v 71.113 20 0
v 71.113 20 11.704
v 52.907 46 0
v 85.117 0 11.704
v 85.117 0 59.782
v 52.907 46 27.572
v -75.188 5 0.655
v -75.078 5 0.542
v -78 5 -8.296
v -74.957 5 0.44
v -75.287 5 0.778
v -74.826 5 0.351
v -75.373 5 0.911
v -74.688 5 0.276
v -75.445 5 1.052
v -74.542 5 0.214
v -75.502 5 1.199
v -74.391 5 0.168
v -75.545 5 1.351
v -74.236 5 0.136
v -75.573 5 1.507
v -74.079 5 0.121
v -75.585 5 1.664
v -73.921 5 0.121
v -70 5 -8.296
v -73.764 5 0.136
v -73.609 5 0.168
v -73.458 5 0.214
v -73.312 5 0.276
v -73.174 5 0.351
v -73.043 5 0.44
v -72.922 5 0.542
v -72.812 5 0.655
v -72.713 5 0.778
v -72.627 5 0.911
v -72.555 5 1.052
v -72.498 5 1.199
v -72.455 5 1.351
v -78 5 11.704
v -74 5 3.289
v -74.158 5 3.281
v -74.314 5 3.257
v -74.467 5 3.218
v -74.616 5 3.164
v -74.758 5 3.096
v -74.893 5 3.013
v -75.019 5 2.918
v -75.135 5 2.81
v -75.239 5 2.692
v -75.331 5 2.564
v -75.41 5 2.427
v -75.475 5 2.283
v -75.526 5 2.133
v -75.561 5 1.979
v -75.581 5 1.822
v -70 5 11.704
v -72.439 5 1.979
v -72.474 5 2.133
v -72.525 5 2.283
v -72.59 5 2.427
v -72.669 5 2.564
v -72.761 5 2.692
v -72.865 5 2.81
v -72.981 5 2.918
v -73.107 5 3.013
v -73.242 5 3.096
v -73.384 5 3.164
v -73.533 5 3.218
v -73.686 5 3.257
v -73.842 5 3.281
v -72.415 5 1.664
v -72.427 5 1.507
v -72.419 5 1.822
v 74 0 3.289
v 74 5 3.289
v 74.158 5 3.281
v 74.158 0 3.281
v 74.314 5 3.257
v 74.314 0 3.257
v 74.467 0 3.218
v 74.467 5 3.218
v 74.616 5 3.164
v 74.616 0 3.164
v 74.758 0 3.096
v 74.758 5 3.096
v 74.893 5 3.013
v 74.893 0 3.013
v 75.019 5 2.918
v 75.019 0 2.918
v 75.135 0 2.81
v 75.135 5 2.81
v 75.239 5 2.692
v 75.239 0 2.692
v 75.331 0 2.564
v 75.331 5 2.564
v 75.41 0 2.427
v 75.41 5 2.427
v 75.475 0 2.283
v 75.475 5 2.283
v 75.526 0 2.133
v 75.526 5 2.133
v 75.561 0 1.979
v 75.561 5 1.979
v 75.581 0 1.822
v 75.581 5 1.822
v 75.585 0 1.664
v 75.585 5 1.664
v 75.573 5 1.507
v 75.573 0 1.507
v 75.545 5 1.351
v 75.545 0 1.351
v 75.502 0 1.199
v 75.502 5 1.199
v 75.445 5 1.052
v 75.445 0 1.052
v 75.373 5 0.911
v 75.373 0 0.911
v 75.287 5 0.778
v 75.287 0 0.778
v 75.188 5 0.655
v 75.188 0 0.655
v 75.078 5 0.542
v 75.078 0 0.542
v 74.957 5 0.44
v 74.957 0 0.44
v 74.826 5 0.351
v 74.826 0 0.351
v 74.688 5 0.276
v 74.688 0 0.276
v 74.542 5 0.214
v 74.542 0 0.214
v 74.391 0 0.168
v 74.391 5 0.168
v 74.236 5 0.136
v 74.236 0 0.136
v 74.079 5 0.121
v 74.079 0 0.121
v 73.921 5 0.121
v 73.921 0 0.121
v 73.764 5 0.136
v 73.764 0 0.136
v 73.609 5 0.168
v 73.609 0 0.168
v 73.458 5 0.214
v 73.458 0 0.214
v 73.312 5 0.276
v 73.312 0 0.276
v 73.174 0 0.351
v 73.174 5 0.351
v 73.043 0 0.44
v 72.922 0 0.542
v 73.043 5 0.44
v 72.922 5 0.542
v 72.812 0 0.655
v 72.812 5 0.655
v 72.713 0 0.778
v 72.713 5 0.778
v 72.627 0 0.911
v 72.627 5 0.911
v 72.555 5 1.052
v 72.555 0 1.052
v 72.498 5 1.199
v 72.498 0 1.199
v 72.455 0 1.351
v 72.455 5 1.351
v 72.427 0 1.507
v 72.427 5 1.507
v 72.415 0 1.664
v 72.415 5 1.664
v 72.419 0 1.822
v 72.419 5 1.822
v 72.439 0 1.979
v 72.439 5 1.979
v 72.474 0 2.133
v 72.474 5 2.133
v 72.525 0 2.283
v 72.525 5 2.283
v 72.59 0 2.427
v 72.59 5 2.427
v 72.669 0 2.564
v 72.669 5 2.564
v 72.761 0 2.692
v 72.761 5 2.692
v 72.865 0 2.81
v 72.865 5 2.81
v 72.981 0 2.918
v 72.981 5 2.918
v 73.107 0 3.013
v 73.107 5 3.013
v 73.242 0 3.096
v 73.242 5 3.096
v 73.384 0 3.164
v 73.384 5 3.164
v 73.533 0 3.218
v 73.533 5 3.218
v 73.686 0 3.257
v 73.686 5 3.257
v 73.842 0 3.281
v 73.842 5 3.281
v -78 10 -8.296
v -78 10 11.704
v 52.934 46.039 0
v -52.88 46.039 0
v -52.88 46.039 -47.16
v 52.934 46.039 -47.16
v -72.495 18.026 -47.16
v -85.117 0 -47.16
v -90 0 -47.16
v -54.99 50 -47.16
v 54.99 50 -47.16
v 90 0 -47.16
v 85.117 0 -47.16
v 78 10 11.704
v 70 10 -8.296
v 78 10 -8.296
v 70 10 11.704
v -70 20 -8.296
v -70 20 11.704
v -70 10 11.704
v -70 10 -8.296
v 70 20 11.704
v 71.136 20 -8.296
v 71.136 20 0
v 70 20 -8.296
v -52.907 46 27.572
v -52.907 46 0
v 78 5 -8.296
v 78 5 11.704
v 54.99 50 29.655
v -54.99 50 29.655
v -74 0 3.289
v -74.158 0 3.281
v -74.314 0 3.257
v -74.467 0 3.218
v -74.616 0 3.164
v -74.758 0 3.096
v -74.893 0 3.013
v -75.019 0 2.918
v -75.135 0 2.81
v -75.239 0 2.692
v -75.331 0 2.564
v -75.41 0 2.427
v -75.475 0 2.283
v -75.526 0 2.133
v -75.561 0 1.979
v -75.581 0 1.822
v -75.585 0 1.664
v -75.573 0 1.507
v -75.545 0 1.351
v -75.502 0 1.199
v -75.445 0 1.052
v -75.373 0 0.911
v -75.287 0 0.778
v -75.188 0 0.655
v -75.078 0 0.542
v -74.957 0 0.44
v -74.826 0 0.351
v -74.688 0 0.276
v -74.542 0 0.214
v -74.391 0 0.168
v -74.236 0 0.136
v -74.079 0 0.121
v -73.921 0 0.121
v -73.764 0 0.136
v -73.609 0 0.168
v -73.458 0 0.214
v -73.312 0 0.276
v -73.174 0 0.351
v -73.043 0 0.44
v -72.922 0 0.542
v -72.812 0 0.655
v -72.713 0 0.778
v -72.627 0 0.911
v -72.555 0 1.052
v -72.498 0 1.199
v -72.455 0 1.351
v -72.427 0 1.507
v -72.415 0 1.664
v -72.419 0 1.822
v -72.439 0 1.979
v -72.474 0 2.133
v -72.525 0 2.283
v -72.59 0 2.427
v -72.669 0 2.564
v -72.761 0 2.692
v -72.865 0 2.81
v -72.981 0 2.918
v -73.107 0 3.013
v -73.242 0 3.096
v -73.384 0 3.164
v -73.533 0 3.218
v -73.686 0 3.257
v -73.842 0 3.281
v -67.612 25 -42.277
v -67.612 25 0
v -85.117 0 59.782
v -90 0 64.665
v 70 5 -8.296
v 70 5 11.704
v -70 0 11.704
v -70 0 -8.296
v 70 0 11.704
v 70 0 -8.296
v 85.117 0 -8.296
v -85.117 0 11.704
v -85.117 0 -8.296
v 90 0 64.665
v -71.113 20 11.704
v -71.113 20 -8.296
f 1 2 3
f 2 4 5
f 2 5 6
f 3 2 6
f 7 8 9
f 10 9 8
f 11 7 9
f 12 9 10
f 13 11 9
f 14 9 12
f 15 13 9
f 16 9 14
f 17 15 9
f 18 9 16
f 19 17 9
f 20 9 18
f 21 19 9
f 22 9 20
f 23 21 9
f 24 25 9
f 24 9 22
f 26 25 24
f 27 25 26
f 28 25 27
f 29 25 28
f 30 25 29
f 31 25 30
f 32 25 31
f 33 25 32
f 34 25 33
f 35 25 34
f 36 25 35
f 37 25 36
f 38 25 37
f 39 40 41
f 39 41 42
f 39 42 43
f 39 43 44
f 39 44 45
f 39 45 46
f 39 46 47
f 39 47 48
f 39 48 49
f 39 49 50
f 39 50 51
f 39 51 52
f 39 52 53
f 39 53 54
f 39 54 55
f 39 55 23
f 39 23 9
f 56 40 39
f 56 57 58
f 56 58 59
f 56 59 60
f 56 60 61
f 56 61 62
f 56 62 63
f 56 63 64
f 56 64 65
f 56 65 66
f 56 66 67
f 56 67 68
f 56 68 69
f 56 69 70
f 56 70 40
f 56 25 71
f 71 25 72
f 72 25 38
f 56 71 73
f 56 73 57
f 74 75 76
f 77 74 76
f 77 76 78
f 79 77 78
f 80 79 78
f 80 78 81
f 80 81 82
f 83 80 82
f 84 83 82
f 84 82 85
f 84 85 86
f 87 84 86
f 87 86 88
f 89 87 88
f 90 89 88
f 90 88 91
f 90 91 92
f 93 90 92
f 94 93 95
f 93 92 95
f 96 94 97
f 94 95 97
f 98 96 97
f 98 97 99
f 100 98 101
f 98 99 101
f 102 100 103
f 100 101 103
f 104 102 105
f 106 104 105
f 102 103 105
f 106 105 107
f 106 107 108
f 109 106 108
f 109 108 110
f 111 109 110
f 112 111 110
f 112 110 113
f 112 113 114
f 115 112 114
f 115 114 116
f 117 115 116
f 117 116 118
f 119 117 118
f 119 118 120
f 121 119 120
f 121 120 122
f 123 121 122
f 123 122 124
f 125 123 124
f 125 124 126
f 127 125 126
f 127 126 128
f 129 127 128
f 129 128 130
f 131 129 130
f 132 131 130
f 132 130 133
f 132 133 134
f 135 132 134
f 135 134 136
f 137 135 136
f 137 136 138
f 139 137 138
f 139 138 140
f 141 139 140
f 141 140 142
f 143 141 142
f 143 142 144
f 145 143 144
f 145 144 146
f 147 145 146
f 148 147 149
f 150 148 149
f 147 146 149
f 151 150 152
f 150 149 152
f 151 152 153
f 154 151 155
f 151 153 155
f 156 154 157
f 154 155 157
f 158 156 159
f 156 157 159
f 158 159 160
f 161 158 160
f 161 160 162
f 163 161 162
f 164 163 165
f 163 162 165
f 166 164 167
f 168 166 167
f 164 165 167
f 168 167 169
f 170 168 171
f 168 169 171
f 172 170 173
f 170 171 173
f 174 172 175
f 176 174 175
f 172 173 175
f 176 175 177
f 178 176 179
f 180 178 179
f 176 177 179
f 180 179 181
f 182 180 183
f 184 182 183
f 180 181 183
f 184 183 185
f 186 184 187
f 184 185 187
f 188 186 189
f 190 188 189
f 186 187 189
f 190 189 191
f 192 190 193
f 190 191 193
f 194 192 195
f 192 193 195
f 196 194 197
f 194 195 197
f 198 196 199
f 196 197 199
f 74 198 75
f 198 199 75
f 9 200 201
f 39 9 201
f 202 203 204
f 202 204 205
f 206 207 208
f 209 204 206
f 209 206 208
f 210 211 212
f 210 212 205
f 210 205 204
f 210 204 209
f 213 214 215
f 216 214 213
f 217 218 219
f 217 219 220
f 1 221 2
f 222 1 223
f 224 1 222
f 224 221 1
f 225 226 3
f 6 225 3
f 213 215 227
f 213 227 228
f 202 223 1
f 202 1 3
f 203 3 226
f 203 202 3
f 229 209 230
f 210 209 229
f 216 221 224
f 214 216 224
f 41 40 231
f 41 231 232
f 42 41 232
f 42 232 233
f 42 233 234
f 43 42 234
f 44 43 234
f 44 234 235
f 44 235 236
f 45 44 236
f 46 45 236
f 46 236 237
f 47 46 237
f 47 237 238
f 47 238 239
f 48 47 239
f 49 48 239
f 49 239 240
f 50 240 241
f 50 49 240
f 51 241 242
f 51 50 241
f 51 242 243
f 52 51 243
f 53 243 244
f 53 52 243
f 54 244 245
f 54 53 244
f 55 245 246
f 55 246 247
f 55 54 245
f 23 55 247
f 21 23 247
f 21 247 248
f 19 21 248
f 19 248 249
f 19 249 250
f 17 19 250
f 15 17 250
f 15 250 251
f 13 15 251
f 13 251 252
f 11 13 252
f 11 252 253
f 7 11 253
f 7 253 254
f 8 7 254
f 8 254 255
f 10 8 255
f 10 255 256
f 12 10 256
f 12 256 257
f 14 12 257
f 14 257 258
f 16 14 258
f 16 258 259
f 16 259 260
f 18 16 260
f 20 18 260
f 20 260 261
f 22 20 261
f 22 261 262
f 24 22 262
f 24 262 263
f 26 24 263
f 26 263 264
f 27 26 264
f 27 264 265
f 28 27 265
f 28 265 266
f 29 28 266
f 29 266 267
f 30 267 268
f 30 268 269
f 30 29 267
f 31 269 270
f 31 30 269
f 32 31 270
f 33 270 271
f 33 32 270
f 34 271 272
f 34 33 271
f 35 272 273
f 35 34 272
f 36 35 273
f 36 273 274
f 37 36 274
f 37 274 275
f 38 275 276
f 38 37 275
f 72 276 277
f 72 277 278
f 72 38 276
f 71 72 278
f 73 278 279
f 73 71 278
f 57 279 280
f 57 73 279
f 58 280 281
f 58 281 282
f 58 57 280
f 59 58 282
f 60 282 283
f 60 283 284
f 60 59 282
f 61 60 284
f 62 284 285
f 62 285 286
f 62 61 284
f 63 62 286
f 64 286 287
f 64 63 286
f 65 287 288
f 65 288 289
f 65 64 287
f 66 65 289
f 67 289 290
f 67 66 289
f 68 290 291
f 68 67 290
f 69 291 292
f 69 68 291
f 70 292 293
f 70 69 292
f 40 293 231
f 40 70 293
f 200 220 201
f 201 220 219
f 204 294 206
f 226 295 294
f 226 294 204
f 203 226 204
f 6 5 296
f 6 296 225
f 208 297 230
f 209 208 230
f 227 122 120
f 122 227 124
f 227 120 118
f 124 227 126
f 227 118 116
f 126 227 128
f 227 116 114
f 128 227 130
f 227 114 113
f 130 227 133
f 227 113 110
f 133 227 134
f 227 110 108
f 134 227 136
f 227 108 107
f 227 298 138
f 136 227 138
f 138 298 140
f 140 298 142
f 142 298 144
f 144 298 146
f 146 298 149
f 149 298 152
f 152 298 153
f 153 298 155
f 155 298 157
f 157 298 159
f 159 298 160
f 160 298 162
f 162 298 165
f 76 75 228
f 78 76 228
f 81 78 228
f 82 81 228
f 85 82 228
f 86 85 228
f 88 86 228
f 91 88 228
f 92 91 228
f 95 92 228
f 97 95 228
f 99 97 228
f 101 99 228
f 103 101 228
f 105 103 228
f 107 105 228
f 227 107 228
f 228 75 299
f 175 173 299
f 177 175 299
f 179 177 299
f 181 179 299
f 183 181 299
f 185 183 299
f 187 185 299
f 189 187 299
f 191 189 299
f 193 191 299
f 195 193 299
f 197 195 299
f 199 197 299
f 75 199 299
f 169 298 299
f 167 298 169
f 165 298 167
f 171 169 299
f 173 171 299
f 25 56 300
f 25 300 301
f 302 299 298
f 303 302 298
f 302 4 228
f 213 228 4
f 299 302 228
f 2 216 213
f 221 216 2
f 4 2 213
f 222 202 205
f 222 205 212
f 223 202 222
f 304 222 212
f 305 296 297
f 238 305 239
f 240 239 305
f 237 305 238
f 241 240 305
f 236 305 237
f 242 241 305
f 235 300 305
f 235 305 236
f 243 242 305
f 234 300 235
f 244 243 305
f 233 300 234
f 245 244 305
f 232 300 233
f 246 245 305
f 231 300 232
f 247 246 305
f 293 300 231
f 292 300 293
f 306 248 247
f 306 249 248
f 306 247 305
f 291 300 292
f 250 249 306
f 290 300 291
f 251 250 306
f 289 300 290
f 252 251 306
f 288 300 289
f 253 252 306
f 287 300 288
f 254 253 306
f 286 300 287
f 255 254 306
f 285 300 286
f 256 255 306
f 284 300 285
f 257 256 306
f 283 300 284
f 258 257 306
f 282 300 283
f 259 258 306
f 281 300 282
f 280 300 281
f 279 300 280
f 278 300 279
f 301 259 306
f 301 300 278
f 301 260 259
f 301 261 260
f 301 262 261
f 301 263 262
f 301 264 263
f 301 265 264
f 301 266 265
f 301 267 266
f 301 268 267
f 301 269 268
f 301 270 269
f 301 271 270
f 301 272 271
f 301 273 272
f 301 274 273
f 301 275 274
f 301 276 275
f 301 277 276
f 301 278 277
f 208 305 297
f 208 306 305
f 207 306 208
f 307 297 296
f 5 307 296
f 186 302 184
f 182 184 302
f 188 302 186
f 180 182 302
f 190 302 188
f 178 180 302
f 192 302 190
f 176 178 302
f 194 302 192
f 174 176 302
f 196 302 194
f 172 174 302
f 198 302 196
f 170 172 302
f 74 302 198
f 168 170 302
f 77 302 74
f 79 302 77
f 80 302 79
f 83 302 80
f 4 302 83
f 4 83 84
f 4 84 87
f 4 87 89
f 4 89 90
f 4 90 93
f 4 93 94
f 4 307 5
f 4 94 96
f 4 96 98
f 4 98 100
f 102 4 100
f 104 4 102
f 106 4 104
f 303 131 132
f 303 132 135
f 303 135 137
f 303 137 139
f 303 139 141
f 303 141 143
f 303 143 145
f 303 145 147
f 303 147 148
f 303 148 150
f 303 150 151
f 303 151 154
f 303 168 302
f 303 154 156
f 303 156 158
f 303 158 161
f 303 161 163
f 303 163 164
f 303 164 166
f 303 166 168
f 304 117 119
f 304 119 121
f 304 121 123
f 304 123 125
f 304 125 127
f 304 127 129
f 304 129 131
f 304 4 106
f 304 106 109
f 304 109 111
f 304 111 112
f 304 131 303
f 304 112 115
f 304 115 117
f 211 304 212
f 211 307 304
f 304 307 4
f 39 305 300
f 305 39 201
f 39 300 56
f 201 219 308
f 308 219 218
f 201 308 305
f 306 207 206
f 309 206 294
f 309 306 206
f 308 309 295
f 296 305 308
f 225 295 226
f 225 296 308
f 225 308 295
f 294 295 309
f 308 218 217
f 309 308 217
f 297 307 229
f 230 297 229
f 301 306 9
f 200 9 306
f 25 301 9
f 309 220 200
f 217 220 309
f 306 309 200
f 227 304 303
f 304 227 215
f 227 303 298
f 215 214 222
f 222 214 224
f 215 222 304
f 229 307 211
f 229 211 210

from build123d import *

# Parameters (mm, degrees)
CROQUIS1_W                  = 180
CROQUIS1_H                  = 129.33
SALIENTE_EXTRUIR1_DEPTH     = 50
CORTAR_EXTRUIR1_REACH       = 167.307
CORTAR_EXTRUIR2_REACH       = 199.691
VACIADO1_T                  = -4
SALIENTE_EXTRUIR4_DEPTH     = 102.58126129
CORTAR_EXTRUIR10_DEPTH      = 92.58126129
CROQUIS15_W                 = 55.421449745
CROQUIS15_H                 = 50
CORTAR_EXTRUIR11_DEPTH      = 146.33724632
CORTAR_EXTRUIR11_DEPTH_BACK = 146.33724632
SALIENTE_EXTRUIR6_REACH     = 181.671
CROQUIS19_W                 = 20
CROQUIS19_H                 = 20
CROQUIS20_W                 = 20
CROQUIS20_H                 = 5
CORTAR_EXTRUIR14_DEPTH      = 8
CORTAR_EXTRUIR15_REACH      = 121.61
CROQUIS22_R                 = 1.585


with BuildPart() as part:
    # Croquis1 → Saliente-Extruir1 (new body)
    with BuildSketch(Plane(origin=(0, 0, 0), x_dir=(1, 0, 0), z_dir=(0, 1, 0))):
        Rectangle(CROQUIS1_W, CROQUIS1_H)
    extrude(amount=SALIENTE_EXTRUIR1_DEPTH)

    # Croquis2 → Cortar-Extruir1 (cut, up to next)
    with BuildSketch(Plane.XY.offset(64.665), mode=Mode.PRIVATE) as cortar_extruir1_sk1:
        Polygon((90, 0), (54.98962309, 50), (90, 50), align=None)
    cortar_extruir1_tool1 = extrude(cortar_extruir1_sk1.sketch, amount=-CORTAR_EXTRUIR1_REACH, mode=Mode.PRIVATE) & part.part
    cortar_extruir1 = cortar_extruir1_tool1.solids().sort_by_distance((78.329874, 33.333333, 64.665))[0]
    add(cortar_extruir1, mode=Mode.SUBTRACT)

    # Cortar-Extruir2: up to this plane
    cortar_extruir2_end = Plane(origin=(90, 0, -64.666), z_dir=(-0.819152044288995, -0.5735764363510416, 0))
    # Croquis4 → Cortar-Extruir2 (cut, up to the surface)
    with BuildSketch(Plane.ZY.offset(90), mode=Mode.PRIVATE) as cortar_extruir2_sk1:
        Polygon((-64.665, 0), (-29.65462309, 50), (-64.665, 50), align=None)
    cortar_extruir2_tool1 = split(extrude(cortar_extruir2_sk1.sketch, amount=-CORTAR_EXTRUIR2_REACH, mode=Mode.PRIVATE), bisect_by=cortar_extruir2_end, keep=Keep.BOTH, mode=Mode.PRIVATE)
    cortar_extruir2 = cortar_extruir2_tool1.solids().sort_by_distance((-90, 33.333333, -52.994874))[0]
    add(cortar_extruir2, mode=Mode.SUBTRACT)

    # Simetría2: Cortar-Extruir2 across plane
    add(cortar_extruir2.mirror(Plane.XY), mode=Mode.SUBTRACT)

    # Simetría1: Cortar-Extruir1 across plane
    add(cortar_extruir1.mirror(Plane(origin=(0, 0, 0), x_dir=(0, 0, 1), z_dir=(1, 0, 0))), mode=Mode.SUBTRACT)

    # Simetría1 at the second plane: Cortar-Extruir1 across plane
    add(cortar_extruir1.mirror(Plane.XY), mode=Mode.SUBTRACT)

    # Vaciado1
    vaciado1_openings = [part.faces().sort_by_distance(p)[0] for p in [
        (0, 0, 0),
    ]]
    offset(amount=VACIADO1_T, openings=vaciado1_openings, kind=Kind.INTERSECTION)

    # Croquis7 → Saliente-Extruir4 (add)
    with BuildSketch(Plane(origin=(0, 14.764441718, 0), x_dir=(-1, 0, 0), z_dir=(0, 0, -1))):
        Polygon((-54.98962309, 10.235558282), (-72.494811545, 10.235558282), (-54.98962309, 35.235558282), (54.98962309, 35.235558282), (72.494811545, 10.235558282), (54.98962309, 10.235558282), align=None)
    extrude(amount=SALIENTE_EXTRUIR4_DEPTH)

    # Croquis14 → Cortar-Extruir10 (cut)
    with BuildSketch(Plane.XY):
        Polygon((-85.116901645, 0), (-52.87991258, 46.039191676), (52.934417466, 46.039191676), (85.116901645, 0), align=None)
    extrude(amount=-CORTAR_EXTRUIR10_DEPTH, mode=Mode.SUBTRACT)

    # Croquis15 → Cortar-Extruir11 (cut, two sides)
    with BuildSketch(Plane(origin=(0, 0, 0), x_dir=(0, 0, -1), z_dir=(1, 0, 0))) as cortar_extruir11_sk:
        with Locations((74.870536418, 25)):
            Rectangle(CROQUIS15_W, CROQUIS15_H)
    extrude(amount=CORTAR_EXTRUIR11_DEPTH, mode=Mode.SUBTRACT)
    extrude(cortar_extruir11_sk.sketch, amount=-CORTAR_EXTRUIR11_DEPTH_BACK, mode=Mode.SUBTRACT)

    # Croquis19 → Saliente-Extruir6 (add, up to next)
    with BuildSketch(Plane(origin=(70, 0, 0), x_dir=(0, 0, -1), z_dir=(1, 0, 0)), mode=Mode.PRIVATE) as saliente_extruir6_sk1:
        with Locations((-1.703719293, 10)):
            Rectangle(CROQUIS19_W, CROQUIS19_H)
    saliente_extruir6_tool1 = extrude(saliente_extruir6_sk1.sketch, amount=SALIENTE_EXTRUIR6_REACH, mode=Mode.PRIVATE) - part.part
    saliente_extruir6 = saliente_extruir6_tool1.solids().sort_by_distance((70, 10, 1.703719))[0]
    add(saliente_extruir6)

    # Croquis20 → Cortar-Extruir14 (cut)
    with BuildSketch(Plane.ZY.offset(-70)):
        with Locations((1.703719293, 7.5)):
            Rectangle(CROQUIS20_W, CROQUIS20_H)
    cortar_extruir14 = extrude(amount=-CORTAR_EXTRUIR14_DEPTH, mode=Mode.SUBTRACT)

    # Croquis22 → Cortar-Extruir15 (cut, up to next)
    with BuildSketch(Plane(origin=(0, 5, 0), x_dir=(1, 0, 0), z_dir=(0, 1, 0)), mode=Mode.PRIVATE) as cortar_extruir15_sk1:
        with Locations(Location((74, -1.703719293, 0), (0, 0, 270))):
            Circle(CROQUIS22_R)
    cortar_extruir15_tool1 = extrude(cortar_extruir15_sk1.sketch, amount=-CORTAR_EXTRUIR15_REACH, mode=Mode.PRIVATE) & part.part
    cortar_extruir15 = cortar_extruir15_tool1.solids().sort_by_distance((74, 5, 1.703719))[0]
    add(cortar_extruir15, mode=Mode.SUBTRACT)

    # Simetría3: Saliente-Extruir6, Cortar-Extruir14, Cortar-Extruir15 across plane
    add(saliente_extruir6.mirror(Plane(origin=(0, 0, 0), x_dir=(0, 0, 1), z_dir=(1, 0, 0))))
    add(cortar_extruir14.mirror(Plane(origin=(0, 0, 0), x_dir=(0, 0, 1), z_dir=(1, 0, 0))), mode=Mode.SUBTRACT)
    add(cortar_extruir15.mirror(Plane(origin=(0, 0, 0), x_dir=(0, 0, 1), z_dir=(1, 0, 0))), mode=Mode.SUBTRACT)


solid = part.part
